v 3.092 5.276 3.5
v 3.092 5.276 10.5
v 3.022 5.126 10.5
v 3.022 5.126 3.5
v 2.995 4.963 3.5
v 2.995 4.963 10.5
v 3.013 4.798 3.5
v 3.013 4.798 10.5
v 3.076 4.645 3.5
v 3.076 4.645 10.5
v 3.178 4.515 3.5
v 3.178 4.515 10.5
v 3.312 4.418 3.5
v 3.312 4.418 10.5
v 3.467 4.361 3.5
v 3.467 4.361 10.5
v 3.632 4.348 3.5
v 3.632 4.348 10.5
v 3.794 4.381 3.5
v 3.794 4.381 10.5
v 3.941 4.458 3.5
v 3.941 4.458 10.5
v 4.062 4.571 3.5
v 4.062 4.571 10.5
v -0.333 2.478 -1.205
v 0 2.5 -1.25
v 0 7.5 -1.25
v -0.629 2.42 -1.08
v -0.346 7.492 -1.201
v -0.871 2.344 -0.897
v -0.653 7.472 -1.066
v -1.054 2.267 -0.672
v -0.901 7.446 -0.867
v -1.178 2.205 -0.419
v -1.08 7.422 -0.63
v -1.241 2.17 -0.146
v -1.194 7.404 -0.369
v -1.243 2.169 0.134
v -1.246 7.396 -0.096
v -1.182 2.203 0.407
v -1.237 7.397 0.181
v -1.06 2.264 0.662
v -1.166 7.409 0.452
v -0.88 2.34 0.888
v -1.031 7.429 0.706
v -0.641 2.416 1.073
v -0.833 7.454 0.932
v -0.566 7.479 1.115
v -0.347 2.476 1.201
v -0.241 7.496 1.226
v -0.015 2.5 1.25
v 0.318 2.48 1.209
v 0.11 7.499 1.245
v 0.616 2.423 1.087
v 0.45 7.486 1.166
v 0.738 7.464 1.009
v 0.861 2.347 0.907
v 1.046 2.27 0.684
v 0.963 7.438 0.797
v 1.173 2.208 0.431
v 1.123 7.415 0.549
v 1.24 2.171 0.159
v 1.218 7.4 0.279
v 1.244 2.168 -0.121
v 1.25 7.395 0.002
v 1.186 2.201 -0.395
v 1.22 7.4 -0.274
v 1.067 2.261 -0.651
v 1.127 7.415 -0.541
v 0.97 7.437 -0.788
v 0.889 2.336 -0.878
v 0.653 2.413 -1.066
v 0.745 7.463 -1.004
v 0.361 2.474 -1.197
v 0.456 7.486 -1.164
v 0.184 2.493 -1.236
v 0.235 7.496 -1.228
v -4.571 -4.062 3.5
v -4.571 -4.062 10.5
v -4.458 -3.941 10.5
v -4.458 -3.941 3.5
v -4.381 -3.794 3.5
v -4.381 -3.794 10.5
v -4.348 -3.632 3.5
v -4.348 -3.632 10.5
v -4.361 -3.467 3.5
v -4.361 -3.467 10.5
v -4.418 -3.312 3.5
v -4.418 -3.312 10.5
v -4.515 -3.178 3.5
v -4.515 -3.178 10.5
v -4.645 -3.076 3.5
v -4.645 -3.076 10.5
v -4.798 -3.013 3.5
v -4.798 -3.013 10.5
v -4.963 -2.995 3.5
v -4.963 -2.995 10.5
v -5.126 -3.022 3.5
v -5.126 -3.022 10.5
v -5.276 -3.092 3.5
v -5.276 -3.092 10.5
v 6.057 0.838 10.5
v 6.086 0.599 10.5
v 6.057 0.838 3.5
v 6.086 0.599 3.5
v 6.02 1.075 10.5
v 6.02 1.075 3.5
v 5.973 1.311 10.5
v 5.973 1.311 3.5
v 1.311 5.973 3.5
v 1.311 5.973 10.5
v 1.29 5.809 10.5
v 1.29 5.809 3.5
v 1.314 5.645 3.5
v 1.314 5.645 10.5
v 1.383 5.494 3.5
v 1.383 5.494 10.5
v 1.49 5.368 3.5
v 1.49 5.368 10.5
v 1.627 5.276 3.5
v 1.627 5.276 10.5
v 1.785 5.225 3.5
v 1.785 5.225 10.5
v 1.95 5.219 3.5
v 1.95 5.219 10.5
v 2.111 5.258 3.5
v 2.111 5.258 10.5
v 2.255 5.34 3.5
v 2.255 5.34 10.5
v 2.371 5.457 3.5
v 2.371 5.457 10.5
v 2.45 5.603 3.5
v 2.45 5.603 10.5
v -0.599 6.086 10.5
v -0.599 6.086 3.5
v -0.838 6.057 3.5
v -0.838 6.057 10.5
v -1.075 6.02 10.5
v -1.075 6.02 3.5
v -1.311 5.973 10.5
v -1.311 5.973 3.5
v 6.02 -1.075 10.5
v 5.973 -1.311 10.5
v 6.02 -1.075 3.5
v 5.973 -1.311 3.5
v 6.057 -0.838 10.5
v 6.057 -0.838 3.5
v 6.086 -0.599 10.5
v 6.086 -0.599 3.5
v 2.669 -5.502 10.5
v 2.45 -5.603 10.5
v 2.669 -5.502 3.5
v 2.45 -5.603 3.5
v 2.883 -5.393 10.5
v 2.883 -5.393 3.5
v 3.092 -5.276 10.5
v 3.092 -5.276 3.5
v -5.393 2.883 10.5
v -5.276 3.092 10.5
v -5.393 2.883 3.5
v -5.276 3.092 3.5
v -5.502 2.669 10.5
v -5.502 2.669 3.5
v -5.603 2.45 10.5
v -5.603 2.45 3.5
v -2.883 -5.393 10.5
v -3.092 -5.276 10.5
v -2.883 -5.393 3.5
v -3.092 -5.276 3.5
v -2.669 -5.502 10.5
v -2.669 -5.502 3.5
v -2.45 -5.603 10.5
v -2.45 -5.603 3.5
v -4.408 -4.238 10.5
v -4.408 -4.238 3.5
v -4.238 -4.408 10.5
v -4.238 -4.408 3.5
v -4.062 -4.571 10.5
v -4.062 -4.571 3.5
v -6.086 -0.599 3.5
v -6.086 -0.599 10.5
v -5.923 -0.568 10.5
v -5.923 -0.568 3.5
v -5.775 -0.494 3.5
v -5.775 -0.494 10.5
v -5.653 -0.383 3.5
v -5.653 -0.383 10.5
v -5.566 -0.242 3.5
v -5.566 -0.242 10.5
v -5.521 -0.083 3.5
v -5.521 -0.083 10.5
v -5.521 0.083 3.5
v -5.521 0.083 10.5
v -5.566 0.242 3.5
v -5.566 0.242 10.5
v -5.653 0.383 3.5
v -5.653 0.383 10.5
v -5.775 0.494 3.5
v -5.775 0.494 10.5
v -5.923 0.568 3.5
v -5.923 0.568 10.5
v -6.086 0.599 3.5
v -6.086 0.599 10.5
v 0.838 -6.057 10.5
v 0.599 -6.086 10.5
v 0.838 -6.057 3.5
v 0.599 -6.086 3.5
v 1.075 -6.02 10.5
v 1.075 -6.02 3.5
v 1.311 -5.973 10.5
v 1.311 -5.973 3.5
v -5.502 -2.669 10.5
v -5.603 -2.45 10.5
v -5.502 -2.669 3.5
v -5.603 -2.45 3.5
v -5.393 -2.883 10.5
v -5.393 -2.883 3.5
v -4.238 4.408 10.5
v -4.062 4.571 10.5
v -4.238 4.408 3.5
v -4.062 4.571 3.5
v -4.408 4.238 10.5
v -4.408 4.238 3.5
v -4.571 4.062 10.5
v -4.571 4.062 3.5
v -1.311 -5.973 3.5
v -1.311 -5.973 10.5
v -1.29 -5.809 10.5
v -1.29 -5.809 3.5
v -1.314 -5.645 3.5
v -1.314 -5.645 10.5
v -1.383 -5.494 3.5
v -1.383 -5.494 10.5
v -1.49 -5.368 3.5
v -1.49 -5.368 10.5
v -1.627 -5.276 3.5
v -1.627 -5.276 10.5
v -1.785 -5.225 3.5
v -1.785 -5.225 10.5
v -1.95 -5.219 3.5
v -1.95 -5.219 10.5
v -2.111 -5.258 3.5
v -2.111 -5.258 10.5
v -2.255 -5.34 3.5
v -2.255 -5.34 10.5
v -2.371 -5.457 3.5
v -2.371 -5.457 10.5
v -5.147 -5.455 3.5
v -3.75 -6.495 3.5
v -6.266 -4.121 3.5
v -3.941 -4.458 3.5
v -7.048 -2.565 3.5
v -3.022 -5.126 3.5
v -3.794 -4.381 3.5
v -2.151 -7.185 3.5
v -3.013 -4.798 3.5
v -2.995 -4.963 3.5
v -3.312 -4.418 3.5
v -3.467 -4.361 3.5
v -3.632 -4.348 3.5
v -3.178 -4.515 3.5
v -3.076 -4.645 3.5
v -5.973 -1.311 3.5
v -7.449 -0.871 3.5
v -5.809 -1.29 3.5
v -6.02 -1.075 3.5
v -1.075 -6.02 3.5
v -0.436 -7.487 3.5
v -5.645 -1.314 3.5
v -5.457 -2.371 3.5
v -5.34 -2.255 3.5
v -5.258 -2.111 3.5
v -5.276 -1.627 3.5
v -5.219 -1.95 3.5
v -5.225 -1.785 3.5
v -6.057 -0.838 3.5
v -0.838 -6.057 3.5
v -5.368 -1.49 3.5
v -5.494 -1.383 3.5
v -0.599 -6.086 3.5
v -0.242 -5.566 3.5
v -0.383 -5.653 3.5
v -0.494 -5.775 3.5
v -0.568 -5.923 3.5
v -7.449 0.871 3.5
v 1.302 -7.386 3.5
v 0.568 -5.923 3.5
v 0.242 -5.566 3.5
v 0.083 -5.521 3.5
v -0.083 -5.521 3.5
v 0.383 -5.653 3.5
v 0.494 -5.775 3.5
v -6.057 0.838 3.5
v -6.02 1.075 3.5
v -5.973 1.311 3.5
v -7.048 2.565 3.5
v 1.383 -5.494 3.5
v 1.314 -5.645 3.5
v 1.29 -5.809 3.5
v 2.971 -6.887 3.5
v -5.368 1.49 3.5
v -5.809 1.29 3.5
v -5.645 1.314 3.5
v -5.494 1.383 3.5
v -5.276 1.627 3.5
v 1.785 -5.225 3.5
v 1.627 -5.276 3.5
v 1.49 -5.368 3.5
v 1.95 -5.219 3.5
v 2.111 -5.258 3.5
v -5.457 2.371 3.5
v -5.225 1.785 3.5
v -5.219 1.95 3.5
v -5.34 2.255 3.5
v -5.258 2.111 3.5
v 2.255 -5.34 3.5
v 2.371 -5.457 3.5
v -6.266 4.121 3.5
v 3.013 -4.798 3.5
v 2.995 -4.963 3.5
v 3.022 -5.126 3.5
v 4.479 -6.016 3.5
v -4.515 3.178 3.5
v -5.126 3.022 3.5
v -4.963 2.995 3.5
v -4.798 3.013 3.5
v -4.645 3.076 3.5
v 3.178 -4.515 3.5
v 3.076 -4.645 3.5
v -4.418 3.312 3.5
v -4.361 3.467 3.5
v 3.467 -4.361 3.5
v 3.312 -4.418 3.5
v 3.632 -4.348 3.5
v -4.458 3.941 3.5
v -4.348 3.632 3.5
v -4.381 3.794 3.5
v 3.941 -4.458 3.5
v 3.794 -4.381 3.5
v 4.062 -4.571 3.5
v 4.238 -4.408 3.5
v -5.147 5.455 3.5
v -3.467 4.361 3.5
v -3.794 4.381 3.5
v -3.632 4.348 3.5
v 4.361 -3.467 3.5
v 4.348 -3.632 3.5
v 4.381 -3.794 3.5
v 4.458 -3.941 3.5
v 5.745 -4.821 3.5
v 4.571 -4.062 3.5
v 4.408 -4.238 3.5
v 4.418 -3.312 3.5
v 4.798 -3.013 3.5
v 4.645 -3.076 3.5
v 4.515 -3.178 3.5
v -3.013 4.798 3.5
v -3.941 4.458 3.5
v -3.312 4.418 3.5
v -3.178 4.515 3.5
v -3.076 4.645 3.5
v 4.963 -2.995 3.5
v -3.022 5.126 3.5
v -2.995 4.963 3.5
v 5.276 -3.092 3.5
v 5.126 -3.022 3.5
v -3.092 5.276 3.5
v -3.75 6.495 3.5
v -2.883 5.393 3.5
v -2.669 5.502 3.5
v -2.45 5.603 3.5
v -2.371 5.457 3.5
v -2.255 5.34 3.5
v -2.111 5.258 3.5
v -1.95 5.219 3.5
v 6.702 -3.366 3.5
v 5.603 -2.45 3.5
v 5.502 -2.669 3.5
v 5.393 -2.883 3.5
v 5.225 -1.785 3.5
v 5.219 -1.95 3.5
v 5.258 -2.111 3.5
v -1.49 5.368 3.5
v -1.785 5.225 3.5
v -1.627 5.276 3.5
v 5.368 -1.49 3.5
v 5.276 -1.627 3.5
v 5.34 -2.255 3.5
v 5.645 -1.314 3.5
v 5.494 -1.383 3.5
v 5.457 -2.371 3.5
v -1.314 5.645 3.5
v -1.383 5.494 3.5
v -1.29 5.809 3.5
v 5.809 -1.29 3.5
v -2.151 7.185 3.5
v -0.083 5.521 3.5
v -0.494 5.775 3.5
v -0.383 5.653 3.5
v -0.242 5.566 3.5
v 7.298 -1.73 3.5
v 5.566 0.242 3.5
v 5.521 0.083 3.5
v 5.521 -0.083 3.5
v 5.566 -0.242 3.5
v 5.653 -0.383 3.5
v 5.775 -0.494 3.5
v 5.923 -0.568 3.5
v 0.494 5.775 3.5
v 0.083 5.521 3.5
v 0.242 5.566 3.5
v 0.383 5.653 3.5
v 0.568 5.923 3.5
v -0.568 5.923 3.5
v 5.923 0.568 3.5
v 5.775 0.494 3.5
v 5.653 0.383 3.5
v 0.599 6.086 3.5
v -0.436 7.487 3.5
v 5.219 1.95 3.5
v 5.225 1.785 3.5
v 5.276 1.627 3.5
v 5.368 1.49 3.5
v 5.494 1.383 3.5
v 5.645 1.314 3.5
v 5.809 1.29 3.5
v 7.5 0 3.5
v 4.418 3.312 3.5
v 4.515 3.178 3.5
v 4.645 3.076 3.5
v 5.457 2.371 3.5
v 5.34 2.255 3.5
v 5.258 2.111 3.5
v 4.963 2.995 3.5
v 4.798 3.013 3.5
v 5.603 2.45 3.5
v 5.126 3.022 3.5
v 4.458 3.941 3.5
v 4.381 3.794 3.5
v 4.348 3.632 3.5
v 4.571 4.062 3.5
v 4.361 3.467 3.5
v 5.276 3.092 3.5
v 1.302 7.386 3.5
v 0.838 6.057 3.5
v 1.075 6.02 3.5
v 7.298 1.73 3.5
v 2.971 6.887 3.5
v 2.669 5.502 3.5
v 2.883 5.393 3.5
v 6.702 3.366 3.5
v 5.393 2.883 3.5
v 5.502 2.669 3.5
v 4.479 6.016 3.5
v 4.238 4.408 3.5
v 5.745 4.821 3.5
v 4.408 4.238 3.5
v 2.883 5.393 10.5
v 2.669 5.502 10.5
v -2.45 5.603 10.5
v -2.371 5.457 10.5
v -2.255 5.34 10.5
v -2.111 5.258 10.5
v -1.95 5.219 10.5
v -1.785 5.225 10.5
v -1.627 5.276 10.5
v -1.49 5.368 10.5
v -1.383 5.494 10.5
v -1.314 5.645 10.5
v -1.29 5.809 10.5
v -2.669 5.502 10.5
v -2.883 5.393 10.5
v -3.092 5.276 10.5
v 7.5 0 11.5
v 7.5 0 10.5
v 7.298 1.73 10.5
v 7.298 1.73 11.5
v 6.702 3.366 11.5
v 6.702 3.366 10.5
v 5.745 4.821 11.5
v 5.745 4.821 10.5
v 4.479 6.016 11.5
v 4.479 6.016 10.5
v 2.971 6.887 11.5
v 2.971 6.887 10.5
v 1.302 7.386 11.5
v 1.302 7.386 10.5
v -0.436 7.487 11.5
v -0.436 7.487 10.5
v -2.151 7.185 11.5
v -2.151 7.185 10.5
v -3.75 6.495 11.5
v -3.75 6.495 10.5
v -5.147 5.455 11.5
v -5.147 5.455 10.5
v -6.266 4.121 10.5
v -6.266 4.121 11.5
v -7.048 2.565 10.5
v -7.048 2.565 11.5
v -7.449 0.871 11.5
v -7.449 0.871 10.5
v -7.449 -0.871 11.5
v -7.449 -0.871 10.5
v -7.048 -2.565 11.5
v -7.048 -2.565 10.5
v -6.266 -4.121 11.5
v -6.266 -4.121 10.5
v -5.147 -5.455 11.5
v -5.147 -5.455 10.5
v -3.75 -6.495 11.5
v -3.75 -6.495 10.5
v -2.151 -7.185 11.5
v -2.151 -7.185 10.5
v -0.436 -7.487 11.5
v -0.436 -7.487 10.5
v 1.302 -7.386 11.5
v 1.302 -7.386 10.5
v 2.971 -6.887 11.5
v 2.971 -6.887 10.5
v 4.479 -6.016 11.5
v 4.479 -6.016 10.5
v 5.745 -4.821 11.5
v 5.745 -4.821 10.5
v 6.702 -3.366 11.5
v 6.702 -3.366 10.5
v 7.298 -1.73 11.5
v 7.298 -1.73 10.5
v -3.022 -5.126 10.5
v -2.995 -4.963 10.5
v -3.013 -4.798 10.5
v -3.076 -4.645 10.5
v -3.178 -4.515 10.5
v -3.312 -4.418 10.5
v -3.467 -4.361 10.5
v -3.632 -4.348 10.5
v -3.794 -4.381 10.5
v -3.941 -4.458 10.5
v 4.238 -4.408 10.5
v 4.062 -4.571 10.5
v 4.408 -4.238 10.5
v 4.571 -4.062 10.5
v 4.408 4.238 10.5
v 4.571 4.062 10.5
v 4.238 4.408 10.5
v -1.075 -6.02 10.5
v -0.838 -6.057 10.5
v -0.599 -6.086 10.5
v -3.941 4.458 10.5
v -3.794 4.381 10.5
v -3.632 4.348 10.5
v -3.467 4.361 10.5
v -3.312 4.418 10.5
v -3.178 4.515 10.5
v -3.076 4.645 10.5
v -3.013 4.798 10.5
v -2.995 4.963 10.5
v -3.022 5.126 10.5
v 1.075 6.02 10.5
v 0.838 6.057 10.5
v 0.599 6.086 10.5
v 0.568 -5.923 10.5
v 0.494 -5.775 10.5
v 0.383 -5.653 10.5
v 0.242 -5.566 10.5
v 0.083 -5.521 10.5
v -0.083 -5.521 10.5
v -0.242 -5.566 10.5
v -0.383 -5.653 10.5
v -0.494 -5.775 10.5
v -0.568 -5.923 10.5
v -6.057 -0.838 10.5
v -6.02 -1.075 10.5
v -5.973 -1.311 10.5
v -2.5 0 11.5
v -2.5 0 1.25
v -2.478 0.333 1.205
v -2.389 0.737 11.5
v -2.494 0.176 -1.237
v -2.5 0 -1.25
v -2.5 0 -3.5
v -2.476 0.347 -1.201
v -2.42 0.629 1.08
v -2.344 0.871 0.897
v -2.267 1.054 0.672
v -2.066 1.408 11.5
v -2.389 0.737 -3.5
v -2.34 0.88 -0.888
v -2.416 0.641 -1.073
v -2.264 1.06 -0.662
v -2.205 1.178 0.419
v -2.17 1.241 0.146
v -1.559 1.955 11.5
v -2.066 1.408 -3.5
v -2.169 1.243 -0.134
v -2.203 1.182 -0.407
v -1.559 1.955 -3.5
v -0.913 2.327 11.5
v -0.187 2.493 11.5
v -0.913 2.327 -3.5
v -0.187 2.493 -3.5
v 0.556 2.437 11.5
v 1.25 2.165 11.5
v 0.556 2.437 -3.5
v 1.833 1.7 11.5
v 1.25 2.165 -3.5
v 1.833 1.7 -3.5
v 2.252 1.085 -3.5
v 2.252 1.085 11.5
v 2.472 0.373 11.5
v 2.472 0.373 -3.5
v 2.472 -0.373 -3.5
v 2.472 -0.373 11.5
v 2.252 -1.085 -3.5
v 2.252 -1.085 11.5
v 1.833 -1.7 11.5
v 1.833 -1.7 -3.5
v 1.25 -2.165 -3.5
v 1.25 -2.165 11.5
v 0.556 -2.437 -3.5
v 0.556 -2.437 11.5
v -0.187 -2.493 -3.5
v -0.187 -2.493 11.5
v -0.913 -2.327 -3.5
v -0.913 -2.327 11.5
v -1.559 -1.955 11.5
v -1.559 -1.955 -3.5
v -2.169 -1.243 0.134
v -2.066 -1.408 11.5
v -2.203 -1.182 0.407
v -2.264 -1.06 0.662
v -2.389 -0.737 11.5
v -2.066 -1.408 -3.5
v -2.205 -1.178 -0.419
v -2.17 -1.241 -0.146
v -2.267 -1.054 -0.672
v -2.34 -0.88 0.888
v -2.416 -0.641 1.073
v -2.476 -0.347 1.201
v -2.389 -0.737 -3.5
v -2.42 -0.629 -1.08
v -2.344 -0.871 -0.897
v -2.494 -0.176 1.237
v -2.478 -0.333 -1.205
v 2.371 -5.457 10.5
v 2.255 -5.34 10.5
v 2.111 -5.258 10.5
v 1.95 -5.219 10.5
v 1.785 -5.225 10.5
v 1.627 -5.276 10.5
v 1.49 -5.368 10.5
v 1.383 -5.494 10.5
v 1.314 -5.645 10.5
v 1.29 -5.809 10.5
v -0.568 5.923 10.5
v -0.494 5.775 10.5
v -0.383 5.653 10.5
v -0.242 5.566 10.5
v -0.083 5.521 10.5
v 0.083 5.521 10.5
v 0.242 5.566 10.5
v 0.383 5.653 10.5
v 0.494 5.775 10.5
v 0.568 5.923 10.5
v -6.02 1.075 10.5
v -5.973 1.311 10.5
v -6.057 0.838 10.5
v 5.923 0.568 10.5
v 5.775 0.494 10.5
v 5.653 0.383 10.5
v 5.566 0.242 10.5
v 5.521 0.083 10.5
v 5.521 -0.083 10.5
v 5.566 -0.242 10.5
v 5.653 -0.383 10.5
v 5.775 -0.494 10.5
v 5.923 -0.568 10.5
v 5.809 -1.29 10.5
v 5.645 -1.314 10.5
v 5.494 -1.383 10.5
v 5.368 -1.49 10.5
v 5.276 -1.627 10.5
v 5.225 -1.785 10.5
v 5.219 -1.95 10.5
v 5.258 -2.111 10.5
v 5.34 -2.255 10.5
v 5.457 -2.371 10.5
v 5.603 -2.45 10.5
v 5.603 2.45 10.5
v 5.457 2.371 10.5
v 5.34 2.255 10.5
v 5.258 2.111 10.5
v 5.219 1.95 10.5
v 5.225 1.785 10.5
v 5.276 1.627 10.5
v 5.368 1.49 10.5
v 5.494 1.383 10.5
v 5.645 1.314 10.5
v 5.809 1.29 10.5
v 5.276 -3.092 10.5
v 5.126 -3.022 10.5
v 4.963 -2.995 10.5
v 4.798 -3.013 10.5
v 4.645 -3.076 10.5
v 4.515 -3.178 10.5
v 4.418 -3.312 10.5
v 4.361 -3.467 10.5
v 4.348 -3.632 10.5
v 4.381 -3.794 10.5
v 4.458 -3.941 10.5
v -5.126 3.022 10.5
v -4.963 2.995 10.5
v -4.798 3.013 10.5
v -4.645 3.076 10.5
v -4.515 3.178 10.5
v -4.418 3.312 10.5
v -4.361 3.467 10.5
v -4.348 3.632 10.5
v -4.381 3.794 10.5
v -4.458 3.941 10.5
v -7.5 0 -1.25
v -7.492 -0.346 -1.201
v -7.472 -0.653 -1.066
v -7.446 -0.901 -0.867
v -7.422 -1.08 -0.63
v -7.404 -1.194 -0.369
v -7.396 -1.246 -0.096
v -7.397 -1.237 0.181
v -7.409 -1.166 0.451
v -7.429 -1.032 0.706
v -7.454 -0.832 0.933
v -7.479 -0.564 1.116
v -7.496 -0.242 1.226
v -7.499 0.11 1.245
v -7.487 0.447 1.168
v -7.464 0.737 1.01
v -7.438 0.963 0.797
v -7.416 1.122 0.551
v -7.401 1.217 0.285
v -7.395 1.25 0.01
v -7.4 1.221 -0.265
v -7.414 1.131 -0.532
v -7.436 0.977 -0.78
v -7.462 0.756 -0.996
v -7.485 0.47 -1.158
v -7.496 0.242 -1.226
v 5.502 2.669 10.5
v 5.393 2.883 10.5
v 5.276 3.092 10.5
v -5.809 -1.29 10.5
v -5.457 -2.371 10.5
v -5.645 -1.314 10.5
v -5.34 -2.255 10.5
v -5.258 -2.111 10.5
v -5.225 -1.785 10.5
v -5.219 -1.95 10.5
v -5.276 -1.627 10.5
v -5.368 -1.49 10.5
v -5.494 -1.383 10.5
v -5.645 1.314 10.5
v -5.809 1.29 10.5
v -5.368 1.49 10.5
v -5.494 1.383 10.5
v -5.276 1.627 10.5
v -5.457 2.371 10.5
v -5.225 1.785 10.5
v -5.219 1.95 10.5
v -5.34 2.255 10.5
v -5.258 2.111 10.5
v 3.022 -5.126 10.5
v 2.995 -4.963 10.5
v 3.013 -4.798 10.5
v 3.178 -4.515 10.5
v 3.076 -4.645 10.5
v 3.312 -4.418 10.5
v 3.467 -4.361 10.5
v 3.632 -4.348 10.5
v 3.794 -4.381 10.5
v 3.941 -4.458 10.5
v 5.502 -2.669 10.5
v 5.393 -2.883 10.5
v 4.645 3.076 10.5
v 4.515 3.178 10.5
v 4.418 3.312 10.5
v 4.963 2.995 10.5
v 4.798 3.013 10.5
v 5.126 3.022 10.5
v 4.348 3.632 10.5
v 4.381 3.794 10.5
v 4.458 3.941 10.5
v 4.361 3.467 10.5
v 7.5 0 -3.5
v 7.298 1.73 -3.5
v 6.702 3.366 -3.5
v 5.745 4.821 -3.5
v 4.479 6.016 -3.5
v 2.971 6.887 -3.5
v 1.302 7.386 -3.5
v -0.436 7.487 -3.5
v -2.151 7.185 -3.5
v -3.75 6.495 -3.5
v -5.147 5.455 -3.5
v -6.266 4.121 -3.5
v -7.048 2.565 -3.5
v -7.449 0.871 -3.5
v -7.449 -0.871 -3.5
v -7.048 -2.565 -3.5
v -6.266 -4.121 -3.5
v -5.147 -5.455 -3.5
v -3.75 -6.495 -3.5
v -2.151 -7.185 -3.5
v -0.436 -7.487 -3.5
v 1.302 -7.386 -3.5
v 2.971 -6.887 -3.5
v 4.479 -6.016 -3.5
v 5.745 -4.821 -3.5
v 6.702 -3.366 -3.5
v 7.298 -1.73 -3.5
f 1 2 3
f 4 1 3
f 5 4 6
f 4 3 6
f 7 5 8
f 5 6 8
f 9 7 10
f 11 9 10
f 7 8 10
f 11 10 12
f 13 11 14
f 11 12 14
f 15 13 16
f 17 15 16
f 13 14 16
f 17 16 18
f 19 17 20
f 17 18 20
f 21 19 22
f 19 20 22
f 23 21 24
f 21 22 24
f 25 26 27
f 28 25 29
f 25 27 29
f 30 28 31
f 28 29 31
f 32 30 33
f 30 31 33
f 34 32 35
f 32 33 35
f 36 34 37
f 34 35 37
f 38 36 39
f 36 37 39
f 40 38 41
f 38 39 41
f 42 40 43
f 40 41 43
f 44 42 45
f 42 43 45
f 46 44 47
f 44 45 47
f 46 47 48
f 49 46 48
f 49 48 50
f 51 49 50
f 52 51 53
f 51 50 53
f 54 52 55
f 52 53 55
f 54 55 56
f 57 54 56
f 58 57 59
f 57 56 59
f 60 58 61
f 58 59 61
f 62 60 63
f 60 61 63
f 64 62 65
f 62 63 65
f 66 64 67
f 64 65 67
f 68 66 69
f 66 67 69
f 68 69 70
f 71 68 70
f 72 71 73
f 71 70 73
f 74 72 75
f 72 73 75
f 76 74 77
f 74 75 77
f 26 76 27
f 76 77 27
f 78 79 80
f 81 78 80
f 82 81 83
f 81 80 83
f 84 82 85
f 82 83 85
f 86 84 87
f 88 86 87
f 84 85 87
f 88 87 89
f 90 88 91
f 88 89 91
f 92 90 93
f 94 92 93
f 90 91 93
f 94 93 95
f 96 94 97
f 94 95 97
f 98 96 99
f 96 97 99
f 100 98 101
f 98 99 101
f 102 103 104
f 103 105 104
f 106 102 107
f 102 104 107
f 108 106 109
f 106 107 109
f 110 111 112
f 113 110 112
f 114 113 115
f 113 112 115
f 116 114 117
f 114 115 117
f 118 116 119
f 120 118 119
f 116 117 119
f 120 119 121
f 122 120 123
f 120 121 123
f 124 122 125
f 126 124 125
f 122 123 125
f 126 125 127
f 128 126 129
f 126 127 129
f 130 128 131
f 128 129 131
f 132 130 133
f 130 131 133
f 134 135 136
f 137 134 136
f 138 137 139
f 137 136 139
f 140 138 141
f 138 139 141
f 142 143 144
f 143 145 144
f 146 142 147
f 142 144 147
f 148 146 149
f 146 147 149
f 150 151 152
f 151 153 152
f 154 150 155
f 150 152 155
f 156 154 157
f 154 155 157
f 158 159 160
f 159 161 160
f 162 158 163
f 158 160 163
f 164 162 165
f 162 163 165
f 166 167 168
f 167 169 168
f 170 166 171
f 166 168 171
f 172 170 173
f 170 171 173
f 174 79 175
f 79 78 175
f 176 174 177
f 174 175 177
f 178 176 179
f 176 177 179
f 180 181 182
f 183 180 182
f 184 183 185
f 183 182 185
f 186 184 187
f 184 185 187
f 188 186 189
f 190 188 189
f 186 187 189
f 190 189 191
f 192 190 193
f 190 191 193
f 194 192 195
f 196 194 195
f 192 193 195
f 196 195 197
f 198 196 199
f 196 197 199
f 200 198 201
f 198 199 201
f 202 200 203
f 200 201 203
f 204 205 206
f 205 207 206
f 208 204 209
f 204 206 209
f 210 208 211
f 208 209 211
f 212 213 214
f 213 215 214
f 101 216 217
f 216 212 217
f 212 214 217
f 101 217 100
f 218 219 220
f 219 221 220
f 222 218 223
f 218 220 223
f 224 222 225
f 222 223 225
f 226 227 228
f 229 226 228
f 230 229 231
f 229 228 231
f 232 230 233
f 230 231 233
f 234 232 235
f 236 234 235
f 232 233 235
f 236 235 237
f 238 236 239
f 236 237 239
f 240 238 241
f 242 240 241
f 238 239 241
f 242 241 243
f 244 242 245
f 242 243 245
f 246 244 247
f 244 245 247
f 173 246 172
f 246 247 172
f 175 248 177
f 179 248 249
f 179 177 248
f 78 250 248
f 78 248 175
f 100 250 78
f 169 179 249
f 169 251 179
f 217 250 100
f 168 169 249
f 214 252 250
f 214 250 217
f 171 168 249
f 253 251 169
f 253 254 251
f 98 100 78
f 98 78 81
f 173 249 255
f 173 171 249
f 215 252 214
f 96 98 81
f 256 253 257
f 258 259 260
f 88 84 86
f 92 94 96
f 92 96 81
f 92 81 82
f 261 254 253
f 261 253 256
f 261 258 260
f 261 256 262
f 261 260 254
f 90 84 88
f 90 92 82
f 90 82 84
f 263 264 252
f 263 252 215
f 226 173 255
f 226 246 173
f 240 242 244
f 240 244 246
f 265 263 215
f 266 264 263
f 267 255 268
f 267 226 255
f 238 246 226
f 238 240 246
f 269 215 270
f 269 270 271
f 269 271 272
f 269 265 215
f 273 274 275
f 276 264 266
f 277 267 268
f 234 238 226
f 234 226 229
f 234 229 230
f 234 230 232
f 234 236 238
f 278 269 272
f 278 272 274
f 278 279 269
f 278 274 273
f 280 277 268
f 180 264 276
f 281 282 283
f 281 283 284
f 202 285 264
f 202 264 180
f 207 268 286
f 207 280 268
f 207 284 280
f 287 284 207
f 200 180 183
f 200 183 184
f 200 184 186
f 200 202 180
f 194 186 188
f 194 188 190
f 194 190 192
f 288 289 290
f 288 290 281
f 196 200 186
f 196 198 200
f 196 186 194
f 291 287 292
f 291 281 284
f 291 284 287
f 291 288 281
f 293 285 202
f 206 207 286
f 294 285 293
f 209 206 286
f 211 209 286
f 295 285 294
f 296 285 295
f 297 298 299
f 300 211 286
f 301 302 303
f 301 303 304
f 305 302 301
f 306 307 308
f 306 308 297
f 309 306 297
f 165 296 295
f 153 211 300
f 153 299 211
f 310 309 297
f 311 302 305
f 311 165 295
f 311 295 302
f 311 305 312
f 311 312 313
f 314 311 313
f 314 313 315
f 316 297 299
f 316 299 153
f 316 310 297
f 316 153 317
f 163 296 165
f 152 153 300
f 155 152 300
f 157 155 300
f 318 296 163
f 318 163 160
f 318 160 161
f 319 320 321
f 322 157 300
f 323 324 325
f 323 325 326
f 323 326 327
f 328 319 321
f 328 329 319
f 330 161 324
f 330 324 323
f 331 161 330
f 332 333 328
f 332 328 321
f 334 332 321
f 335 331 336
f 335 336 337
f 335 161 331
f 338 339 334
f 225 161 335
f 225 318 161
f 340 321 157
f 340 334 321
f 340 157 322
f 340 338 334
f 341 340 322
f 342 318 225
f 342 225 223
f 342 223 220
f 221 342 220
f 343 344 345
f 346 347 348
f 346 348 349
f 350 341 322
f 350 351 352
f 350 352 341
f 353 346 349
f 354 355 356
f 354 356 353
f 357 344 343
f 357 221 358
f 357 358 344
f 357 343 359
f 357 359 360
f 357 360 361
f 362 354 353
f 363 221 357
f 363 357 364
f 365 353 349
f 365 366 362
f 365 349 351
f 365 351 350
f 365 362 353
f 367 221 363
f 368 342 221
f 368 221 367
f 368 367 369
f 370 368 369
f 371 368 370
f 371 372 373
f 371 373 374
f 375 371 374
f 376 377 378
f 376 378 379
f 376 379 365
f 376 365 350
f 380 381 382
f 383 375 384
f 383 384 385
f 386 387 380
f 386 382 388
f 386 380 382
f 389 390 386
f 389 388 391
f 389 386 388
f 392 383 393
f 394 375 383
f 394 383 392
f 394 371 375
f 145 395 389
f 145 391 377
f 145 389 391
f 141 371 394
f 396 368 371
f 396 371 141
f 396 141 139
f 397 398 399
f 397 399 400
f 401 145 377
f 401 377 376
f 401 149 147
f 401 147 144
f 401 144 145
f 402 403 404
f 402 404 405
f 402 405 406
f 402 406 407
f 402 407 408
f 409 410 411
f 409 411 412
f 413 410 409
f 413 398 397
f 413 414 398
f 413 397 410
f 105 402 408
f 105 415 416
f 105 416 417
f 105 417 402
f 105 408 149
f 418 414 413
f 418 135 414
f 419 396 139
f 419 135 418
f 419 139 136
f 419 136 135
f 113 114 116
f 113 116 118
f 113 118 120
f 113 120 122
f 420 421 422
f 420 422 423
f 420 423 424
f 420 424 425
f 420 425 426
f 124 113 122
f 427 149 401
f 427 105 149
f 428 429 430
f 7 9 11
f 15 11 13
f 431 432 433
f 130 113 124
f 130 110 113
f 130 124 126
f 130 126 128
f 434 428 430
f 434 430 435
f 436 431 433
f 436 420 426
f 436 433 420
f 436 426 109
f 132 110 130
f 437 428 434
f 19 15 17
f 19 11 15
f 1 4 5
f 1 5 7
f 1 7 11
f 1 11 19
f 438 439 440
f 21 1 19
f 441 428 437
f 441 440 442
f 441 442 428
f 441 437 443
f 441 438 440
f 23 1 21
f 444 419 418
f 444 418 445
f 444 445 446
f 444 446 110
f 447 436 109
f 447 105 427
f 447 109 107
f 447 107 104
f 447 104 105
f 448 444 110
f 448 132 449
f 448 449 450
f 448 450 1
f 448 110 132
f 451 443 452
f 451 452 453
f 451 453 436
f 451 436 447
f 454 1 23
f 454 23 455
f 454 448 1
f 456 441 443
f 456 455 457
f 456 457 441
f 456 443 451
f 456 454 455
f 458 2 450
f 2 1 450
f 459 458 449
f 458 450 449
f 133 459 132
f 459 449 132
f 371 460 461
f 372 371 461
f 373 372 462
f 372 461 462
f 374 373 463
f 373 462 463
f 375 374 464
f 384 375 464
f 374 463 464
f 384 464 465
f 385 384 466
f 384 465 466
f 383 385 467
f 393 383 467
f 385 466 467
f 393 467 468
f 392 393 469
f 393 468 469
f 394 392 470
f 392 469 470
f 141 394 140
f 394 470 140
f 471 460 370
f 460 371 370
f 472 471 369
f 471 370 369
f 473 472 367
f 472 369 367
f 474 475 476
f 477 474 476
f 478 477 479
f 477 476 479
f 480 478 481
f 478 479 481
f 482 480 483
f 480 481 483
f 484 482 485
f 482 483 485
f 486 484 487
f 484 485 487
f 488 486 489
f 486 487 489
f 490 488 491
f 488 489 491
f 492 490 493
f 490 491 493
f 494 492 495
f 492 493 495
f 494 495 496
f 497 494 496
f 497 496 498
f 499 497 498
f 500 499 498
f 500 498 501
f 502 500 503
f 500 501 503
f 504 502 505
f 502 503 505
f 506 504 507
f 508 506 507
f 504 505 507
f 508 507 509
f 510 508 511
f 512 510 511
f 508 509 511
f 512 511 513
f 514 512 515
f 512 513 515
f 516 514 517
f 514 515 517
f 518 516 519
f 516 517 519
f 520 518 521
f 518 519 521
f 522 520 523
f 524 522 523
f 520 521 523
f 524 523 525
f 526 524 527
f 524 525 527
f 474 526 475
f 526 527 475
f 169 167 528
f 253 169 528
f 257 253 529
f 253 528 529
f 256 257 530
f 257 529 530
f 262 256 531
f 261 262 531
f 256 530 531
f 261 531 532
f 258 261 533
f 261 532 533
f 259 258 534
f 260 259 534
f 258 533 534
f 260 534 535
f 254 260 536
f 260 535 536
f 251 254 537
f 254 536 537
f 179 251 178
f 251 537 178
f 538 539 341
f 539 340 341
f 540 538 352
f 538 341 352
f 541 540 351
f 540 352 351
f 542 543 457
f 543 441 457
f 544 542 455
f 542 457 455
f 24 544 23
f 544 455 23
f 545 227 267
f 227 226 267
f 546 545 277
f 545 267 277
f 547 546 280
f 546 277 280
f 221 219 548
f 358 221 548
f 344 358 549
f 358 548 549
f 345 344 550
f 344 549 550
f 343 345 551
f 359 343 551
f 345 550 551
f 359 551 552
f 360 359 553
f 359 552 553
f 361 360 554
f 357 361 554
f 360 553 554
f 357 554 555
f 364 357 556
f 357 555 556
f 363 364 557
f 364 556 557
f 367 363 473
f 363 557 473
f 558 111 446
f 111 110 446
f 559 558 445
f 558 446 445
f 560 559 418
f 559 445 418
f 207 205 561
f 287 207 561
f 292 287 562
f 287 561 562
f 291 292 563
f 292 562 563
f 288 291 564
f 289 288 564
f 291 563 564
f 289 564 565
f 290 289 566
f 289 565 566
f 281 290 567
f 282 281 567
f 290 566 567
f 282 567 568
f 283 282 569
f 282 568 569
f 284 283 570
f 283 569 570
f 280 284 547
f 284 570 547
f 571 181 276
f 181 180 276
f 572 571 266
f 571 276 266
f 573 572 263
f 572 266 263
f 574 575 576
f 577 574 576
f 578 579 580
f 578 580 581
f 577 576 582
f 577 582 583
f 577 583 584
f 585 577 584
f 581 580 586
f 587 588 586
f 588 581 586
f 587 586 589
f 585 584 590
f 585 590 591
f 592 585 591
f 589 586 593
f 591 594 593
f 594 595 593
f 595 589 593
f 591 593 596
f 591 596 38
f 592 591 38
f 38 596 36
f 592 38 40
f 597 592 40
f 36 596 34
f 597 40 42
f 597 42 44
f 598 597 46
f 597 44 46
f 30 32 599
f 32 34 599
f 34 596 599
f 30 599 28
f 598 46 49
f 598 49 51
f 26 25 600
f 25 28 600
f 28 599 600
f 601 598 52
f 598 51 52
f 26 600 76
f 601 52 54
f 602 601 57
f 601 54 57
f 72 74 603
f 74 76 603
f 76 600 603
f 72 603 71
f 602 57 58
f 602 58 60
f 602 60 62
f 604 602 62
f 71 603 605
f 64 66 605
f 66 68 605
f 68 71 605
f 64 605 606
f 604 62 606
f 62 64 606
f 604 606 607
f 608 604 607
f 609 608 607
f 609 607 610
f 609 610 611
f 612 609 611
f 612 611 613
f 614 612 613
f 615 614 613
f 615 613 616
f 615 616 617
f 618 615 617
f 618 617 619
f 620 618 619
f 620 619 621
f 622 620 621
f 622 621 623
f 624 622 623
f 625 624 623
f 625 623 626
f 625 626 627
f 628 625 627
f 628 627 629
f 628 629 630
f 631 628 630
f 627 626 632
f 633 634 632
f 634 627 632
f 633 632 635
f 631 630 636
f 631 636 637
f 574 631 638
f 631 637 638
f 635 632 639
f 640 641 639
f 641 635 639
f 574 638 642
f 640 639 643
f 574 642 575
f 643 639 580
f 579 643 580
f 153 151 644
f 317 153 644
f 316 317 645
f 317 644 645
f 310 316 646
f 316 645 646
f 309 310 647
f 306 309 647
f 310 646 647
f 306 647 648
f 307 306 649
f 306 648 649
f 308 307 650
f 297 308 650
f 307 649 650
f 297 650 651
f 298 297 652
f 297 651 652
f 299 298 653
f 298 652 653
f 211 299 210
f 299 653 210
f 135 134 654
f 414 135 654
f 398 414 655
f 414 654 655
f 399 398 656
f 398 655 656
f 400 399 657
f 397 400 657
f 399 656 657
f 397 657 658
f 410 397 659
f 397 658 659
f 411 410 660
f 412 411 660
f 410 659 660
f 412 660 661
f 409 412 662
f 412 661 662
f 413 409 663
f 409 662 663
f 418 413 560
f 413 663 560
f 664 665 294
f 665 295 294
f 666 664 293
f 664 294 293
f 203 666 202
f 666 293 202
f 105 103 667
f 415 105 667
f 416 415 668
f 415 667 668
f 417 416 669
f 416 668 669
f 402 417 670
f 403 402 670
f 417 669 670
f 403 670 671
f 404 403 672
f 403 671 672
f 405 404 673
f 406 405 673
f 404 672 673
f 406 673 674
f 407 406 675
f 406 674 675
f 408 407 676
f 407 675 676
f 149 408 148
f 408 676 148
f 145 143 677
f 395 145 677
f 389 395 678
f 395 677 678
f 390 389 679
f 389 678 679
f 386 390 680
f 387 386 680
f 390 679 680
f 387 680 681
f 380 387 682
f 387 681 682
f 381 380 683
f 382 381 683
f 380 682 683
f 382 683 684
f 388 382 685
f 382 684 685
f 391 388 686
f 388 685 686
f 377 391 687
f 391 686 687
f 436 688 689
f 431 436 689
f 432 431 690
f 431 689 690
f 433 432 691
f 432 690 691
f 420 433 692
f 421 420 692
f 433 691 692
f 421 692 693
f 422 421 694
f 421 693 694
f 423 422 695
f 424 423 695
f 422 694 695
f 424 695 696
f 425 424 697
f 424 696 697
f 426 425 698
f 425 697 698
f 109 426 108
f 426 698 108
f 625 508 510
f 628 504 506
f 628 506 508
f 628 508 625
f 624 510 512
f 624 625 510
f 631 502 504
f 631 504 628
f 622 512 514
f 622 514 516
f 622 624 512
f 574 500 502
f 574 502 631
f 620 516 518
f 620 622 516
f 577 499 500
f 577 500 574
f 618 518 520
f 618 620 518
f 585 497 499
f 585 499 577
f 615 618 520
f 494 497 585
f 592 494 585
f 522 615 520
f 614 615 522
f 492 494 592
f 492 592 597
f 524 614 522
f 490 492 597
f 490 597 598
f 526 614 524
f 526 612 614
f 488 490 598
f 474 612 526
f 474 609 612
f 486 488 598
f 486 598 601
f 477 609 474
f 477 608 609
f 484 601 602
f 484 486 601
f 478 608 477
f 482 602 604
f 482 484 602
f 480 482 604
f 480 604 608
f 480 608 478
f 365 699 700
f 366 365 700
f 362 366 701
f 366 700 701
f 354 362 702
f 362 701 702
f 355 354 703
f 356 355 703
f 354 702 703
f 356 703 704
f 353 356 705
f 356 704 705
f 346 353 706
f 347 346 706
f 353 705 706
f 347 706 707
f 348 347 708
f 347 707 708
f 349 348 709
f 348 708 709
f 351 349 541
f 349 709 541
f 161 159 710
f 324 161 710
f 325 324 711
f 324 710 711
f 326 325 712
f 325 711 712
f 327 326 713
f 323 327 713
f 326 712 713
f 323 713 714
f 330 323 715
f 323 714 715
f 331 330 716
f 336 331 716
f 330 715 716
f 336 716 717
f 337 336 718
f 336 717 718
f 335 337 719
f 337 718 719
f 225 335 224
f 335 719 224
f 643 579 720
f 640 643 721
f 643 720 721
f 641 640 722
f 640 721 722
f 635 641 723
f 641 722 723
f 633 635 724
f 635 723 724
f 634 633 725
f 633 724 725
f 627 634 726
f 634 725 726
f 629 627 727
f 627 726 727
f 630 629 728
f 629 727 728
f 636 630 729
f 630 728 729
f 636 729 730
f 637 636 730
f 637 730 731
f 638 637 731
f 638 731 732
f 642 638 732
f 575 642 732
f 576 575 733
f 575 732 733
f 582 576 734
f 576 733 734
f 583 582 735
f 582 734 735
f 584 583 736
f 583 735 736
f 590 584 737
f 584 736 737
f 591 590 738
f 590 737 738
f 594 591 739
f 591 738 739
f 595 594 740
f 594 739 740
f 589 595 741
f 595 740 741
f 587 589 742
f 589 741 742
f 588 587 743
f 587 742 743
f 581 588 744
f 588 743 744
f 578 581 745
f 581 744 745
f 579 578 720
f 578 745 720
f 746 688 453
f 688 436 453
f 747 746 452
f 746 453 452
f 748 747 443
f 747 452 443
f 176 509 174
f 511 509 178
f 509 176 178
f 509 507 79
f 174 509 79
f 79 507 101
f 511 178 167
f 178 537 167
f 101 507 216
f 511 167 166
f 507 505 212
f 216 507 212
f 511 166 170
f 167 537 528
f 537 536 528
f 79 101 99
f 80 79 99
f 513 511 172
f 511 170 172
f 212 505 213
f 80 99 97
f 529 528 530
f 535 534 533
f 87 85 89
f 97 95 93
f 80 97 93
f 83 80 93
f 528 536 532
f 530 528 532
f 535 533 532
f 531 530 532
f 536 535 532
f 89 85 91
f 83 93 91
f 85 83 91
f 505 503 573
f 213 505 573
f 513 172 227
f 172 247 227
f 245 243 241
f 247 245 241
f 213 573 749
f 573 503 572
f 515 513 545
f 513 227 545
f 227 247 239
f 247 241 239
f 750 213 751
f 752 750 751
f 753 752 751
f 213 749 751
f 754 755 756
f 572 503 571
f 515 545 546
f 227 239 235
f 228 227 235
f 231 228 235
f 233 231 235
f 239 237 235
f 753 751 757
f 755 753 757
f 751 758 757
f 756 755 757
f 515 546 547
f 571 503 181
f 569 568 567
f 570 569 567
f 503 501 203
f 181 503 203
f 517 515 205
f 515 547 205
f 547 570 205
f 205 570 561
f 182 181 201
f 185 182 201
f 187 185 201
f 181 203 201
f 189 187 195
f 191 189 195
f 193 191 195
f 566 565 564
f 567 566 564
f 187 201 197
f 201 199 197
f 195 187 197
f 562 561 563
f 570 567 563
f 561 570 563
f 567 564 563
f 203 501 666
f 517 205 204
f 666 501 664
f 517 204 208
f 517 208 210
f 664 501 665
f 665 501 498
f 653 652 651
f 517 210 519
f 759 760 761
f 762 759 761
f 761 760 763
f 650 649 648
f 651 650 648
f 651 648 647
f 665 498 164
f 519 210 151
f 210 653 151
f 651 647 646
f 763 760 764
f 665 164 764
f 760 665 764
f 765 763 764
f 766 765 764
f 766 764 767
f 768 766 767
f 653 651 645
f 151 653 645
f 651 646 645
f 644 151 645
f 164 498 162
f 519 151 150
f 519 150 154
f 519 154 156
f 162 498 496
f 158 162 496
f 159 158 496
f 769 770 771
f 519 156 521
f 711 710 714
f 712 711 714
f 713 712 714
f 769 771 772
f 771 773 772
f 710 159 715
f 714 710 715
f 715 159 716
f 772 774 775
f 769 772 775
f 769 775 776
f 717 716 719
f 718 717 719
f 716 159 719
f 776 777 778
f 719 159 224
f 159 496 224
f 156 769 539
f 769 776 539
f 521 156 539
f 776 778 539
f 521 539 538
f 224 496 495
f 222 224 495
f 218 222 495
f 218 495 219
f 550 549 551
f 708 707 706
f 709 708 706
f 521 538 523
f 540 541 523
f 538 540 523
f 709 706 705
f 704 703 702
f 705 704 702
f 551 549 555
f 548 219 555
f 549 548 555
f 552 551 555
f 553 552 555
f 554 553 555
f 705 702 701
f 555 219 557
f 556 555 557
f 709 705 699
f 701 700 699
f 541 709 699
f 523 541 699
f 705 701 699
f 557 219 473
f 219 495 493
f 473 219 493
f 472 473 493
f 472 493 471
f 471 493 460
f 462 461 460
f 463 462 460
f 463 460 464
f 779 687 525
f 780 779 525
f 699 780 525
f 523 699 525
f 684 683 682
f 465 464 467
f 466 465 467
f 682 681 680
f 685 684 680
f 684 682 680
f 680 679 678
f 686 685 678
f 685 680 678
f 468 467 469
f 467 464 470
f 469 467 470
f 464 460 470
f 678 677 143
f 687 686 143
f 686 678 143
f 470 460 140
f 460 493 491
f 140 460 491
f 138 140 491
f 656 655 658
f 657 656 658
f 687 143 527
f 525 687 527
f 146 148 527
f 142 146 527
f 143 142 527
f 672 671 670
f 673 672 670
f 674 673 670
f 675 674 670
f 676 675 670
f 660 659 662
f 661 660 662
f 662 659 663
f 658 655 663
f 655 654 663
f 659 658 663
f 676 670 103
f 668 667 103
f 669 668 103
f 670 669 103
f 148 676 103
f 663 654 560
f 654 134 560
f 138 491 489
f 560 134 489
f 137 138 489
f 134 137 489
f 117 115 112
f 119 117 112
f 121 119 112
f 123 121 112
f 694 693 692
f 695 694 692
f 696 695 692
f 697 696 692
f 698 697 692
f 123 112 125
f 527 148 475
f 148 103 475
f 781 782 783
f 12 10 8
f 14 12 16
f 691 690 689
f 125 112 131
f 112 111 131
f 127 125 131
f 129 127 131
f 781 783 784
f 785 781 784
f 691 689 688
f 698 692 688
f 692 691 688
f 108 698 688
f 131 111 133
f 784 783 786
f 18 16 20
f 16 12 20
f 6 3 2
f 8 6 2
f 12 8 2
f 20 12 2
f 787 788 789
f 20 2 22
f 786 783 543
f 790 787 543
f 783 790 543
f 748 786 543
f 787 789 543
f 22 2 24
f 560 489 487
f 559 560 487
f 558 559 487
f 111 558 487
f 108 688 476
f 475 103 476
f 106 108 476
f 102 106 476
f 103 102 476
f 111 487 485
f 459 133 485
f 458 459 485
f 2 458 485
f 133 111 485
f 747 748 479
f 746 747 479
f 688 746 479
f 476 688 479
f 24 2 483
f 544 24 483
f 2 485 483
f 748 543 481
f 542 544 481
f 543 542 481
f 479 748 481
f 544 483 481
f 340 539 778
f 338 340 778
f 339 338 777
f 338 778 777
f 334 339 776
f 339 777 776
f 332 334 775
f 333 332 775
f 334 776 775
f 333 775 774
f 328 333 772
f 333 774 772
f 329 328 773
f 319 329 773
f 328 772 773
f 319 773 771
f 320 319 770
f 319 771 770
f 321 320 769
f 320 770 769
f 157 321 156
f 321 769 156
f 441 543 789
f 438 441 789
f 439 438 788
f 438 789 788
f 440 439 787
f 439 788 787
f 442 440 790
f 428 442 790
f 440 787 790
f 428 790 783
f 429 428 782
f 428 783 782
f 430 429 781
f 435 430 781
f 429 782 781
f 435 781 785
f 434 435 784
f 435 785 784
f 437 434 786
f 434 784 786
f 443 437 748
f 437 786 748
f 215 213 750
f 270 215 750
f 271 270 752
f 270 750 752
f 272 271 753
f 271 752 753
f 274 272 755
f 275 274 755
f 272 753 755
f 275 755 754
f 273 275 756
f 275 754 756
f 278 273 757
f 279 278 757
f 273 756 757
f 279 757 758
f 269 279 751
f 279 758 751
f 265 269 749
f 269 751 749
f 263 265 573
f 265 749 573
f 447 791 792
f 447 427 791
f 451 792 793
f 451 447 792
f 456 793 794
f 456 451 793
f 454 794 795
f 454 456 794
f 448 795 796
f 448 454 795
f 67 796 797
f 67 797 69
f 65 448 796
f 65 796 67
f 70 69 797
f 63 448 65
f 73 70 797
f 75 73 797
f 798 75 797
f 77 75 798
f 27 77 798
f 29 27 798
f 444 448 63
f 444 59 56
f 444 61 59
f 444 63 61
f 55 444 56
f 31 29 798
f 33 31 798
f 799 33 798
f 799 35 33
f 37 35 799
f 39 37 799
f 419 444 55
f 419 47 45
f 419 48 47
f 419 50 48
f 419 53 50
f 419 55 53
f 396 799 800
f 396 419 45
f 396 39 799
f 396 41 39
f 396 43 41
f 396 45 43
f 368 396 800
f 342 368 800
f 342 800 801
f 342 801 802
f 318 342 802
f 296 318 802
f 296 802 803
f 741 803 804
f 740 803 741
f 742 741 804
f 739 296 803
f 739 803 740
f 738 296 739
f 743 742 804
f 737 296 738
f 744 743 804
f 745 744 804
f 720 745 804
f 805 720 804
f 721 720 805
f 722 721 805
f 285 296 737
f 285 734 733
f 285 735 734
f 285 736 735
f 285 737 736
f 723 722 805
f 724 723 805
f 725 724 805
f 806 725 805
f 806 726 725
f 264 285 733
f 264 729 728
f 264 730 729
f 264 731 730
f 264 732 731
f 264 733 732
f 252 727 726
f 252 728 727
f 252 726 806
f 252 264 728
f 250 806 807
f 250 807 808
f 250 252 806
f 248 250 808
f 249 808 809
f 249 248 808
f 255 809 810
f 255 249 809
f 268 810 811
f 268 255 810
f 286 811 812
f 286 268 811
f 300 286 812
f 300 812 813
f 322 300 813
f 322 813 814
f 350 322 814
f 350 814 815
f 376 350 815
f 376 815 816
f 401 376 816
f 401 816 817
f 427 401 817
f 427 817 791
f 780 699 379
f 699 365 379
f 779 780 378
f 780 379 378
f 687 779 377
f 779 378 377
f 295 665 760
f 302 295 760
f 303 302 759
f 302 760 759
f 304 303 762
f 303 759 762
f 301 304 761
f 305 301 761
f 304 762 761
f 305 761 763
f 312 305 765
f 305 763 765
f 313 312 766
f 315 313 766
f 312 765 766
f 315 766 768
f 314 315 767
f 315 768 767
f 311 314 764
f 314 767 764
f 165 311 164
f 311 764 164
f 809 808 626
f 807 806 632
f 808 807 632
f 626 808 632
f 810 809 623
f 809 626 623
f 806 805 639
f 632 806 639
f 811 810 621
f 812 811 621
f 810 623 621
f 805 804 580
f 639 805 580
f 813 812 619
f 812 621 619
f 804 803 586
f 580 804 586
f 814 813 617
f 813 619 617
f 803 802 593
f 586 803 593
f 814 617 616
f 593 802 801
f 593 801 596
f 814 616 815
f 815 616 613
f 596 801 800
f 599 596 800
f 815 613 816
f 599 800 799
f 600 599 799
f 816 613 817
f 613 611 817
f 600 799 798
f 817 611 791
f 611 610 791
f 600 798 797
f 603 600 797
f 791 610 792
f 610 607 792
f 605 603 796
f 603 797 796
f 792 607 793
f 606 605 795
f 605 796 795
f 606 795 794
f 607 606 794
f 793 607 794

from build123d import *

# Parameters (mm, degrees)
SKETCH_1_R               = 7.5
EXTRUDE_1_DEPTH          = 3.5
SKETCH_2_R               = 6.115
EXTRUDE_2_DEPTH          = 7
CUT_EXTRUDE_3_DEPTH      = 7
SKETCH_3_R               = 7.5
EXTRUDE_3_DEPTH          = 1
SKETCH_6_R               = 2.5
CUT_EXTRUDE_2_DEPTH      = 16
PATTERN_CIRCULAR_2_COUNT = 20
SKETCH_13_W              = 1.25
SKETCH_13_H              = 7.5
PATTERN_CIRCULAR_4_COUNT = 2
PATTERN_CIRCULAR_4_ANGLE = 90


with BuildPart() as part:
    # 草圖1 → 填料-伸長1 (new body, symmetric)
    with BuildSketch(Plane.XY):
        Circle(SKETCH_1_R)
    extrude(amount=EXTRUDE_1_DEPTH, both=True)

    # 草圖2 → 填料-伸長2 (add)
    with BuildSketch(Plane.XY.offset(3.5)):
        Circle(SKETCH_2_R)
    extrude(amount=EXTRUDE_2_DEPTH)

    # 草圖7 → 除料-伸長3 (cut)
    with BuildSketch(Plane.XY.offset(10.5)):
        with BuildLine():
            ThreePointArc((-0.599277509, 6.085564186), (0, 5.515), (0.599277509, 6.085564186))
            ThreePointArc((0.599277509, 6.085564186), (0, 6.115), (-0.599277509, 6.085564186))
        make_face()
    cut_extrude_3 = extrude(amount=-CUT_EXTRUDE_3_DEPTH, mode=Mode.SUBTRACT)

    # 草圖3 → 填料-伸長3 (add)
    with BuildSketch(Plane.XY.offset(10.5)):
        Circle(SKETCH_3_R)
    extrude(amount=EXTRUDE_3_DEPTH)

    # 草圖6 → 除料-伸長2 (cut, through all)
    with BuildSketch(Plane(origin=(0, 0, -3.5), x_dir=(-1, 0, 0), z_dir=(0, 0, -1))):
        Circle(SKETCH_6_R)
    extrude(amount=-CUT_EXTRUDE_2_DEPTH, mode=Mode.SUBTRACT)

    # 環狀複製排列2: 除料-伸長3 ×20 about axis
    pattern_circular_2_axis = Axis((0, 0, 0), (0, 0, 1))
    for i in range(1, PATTERN_CIRCULAR_2_COUNT):
        add(cut_extrude_3.rotate(pattern_circular_2_axis, i * 360 / PATTERN_CIRCULAR_2_COUNT), mode=Mode.SUBTRACT)

    # 草圖13 → M3x0.5 螺紋孔3 (revolve, cut)
    with BuildSketch(Plane(origin=(0, 0, 0), x_dir=(0, 0, -1), z_dir=(1, 0, 0))):
        with Locations((0.625, 3.75)):
            Rectangle(SKETCH_13_W, SKETCH_13_H)
    m3x0_5_3 = revolve(axis=Axis((0, -6.35, 0), (0, 1, 0)), mode=Mode.SUBTRACT)

    # 環狀複製排列4: M3x0.5 螺紋孔3 ×2 about axis
    pattern_circular_4_axis = Axis((0, 0, 3.5), (0, 0, 1))
    for i in range(1, PATTERN_CIRCULAR_4_COUNT):
        add(m3x0_5_3.rotate(pattern_circular_4_axis, i * PATTERN_CIRCULAR_4_ANGLE / (PATTERN_CIRCULAR_4_COUNT - 1)), mode=Mode.SUBTRACT)


solid = part.part
